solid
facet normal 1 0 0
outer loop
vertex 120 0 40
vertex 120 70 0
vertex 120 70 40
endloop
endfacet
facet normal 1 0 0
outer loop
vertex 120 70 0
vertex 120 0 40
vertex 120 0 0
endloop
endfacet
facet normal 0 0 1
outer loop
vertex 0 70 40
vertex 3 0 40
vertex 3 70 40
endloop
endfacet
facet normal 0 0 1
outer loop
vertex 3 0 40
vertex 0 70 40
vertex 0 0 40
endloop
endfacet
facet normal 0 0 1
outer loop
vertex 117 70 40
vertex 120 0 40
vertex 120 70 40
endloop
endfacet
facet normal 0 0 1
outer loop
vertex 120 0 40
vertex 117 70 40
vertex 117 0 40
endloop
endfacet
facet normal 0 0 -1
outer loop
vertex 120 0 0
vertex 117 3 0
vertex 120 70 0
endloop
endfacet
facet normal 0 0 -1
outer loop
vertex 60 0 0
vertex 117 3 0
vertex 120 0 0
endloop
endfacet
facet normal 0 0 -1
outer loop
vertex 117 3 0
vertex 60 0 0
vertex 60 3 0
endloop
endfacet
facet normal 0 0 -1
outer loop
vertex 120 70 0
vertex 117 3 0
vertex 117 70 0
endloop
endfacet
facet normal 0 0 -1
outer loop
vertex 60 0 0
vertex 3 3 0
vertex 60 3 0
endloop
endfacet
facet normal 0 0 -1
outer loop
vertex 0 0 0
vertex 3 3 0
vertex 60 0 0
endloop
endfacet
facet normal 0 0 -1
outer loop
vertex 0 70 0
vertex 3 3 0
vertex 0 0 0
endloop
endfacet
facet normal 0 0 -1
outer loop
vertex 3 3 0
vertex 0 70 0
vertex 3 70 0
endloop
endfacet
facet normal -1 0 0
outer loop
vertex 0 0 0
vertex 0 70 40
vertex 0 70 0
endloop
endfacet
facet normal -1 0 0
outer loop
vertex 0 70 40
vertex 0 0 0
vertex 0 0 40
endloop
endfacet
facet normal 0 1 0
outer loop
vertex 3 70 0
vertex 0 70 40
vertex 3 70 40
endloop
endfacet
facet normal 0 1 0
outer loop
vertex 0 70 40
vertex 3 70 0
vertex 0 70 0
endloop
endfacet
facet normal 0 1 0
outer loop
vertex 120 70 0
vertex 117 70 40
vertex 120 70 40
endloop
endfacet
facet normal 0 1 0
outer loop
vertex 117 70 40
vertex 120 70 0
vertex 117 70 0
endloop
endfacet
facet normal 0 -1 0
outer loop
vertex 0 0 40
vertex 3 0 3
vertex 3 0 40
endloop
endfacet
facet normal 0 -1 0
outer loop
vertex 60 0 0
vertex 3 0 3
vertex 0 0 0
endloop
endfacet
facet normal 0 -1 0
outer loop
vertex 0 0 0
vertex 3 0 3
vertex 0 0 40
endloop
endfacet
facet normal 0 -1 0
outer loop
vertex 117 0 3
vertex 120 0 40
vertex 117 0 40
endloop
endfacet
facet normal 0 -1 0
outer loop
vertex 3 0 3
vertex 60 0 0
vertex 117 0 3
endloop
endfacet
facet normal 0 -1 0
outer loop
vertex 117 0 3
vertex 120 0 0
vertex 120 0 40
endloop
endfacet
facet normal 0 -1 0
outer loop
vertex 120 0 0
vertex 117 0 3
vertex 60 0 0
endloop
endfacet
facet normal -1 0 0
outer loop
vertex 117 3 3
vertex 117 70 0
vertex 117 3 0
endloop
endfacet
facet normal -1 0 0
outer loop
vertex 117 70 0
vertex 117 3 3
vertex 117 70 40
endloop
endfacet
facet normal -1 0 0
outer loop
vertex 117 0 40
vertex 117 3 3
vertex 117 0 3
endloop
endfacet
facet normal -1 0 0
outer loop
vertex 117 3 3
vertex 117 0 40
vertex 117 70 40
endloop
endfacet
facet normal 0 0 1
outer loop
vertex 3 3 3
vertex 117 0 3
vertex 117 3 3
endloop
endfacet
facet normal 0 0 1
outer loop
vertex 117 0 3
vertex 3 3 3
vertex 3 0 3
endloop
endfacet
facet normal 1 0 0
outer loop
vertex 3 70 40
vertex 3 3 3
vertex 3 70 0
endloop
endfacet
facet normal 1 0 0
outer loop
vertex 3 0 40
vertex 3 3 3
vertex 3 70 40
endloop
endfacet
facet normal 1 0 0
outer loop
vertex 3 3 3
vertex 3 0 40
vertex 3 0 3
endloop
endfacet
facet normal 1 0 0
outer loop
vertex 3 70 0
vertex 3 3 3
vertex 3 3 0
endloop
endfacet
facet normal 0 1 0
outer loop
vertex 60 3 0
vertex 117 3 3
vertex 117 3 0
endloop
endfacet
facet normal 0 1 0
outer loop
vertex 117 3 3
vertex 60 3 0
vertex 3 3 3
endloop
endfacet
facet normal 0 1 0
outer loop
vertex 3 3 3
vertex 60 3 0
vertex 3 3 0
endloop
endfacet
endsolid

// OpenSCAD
// Buffer tank for a mini horizontal gel-electrophoresis box. Open-top rectangular tank with a
// solid raised platform for the gel tray that divides the bottom into two buffer chambers. Each
// end wall gets a horizontal 2 mm hole along X at y = 0, z = 30 for the electrode wires.
//

X  = 120;
Y  = 70;
Z  = 40;
w  = 3;
floor = 3;
platform_L = 60;
platform_h = 10;

$fn = 64;

inner_X = X - 2 * w;
inner_Z = Z - floor;

difference() {
    cube([X, Y, Z]);
    translate([w, 0, floor]) cube([inner_X, Y, inner_Z]);     // hollow out the interior
    translate([w, w, 0]) cube([inner_X, Y, floor]);           // keep the floor solid
    translate([w, w, inner_Z - platform_h])
        cube([platform_L, Y, platform_h]);                     // raised platform for the gel tray

    for (x = [-X / 2, X / 2])
        translate([x, 0, -1]) rotate([-90, 0, 0]) cylinder(h = Z + 2, d = 2);  // electrode holes
}
